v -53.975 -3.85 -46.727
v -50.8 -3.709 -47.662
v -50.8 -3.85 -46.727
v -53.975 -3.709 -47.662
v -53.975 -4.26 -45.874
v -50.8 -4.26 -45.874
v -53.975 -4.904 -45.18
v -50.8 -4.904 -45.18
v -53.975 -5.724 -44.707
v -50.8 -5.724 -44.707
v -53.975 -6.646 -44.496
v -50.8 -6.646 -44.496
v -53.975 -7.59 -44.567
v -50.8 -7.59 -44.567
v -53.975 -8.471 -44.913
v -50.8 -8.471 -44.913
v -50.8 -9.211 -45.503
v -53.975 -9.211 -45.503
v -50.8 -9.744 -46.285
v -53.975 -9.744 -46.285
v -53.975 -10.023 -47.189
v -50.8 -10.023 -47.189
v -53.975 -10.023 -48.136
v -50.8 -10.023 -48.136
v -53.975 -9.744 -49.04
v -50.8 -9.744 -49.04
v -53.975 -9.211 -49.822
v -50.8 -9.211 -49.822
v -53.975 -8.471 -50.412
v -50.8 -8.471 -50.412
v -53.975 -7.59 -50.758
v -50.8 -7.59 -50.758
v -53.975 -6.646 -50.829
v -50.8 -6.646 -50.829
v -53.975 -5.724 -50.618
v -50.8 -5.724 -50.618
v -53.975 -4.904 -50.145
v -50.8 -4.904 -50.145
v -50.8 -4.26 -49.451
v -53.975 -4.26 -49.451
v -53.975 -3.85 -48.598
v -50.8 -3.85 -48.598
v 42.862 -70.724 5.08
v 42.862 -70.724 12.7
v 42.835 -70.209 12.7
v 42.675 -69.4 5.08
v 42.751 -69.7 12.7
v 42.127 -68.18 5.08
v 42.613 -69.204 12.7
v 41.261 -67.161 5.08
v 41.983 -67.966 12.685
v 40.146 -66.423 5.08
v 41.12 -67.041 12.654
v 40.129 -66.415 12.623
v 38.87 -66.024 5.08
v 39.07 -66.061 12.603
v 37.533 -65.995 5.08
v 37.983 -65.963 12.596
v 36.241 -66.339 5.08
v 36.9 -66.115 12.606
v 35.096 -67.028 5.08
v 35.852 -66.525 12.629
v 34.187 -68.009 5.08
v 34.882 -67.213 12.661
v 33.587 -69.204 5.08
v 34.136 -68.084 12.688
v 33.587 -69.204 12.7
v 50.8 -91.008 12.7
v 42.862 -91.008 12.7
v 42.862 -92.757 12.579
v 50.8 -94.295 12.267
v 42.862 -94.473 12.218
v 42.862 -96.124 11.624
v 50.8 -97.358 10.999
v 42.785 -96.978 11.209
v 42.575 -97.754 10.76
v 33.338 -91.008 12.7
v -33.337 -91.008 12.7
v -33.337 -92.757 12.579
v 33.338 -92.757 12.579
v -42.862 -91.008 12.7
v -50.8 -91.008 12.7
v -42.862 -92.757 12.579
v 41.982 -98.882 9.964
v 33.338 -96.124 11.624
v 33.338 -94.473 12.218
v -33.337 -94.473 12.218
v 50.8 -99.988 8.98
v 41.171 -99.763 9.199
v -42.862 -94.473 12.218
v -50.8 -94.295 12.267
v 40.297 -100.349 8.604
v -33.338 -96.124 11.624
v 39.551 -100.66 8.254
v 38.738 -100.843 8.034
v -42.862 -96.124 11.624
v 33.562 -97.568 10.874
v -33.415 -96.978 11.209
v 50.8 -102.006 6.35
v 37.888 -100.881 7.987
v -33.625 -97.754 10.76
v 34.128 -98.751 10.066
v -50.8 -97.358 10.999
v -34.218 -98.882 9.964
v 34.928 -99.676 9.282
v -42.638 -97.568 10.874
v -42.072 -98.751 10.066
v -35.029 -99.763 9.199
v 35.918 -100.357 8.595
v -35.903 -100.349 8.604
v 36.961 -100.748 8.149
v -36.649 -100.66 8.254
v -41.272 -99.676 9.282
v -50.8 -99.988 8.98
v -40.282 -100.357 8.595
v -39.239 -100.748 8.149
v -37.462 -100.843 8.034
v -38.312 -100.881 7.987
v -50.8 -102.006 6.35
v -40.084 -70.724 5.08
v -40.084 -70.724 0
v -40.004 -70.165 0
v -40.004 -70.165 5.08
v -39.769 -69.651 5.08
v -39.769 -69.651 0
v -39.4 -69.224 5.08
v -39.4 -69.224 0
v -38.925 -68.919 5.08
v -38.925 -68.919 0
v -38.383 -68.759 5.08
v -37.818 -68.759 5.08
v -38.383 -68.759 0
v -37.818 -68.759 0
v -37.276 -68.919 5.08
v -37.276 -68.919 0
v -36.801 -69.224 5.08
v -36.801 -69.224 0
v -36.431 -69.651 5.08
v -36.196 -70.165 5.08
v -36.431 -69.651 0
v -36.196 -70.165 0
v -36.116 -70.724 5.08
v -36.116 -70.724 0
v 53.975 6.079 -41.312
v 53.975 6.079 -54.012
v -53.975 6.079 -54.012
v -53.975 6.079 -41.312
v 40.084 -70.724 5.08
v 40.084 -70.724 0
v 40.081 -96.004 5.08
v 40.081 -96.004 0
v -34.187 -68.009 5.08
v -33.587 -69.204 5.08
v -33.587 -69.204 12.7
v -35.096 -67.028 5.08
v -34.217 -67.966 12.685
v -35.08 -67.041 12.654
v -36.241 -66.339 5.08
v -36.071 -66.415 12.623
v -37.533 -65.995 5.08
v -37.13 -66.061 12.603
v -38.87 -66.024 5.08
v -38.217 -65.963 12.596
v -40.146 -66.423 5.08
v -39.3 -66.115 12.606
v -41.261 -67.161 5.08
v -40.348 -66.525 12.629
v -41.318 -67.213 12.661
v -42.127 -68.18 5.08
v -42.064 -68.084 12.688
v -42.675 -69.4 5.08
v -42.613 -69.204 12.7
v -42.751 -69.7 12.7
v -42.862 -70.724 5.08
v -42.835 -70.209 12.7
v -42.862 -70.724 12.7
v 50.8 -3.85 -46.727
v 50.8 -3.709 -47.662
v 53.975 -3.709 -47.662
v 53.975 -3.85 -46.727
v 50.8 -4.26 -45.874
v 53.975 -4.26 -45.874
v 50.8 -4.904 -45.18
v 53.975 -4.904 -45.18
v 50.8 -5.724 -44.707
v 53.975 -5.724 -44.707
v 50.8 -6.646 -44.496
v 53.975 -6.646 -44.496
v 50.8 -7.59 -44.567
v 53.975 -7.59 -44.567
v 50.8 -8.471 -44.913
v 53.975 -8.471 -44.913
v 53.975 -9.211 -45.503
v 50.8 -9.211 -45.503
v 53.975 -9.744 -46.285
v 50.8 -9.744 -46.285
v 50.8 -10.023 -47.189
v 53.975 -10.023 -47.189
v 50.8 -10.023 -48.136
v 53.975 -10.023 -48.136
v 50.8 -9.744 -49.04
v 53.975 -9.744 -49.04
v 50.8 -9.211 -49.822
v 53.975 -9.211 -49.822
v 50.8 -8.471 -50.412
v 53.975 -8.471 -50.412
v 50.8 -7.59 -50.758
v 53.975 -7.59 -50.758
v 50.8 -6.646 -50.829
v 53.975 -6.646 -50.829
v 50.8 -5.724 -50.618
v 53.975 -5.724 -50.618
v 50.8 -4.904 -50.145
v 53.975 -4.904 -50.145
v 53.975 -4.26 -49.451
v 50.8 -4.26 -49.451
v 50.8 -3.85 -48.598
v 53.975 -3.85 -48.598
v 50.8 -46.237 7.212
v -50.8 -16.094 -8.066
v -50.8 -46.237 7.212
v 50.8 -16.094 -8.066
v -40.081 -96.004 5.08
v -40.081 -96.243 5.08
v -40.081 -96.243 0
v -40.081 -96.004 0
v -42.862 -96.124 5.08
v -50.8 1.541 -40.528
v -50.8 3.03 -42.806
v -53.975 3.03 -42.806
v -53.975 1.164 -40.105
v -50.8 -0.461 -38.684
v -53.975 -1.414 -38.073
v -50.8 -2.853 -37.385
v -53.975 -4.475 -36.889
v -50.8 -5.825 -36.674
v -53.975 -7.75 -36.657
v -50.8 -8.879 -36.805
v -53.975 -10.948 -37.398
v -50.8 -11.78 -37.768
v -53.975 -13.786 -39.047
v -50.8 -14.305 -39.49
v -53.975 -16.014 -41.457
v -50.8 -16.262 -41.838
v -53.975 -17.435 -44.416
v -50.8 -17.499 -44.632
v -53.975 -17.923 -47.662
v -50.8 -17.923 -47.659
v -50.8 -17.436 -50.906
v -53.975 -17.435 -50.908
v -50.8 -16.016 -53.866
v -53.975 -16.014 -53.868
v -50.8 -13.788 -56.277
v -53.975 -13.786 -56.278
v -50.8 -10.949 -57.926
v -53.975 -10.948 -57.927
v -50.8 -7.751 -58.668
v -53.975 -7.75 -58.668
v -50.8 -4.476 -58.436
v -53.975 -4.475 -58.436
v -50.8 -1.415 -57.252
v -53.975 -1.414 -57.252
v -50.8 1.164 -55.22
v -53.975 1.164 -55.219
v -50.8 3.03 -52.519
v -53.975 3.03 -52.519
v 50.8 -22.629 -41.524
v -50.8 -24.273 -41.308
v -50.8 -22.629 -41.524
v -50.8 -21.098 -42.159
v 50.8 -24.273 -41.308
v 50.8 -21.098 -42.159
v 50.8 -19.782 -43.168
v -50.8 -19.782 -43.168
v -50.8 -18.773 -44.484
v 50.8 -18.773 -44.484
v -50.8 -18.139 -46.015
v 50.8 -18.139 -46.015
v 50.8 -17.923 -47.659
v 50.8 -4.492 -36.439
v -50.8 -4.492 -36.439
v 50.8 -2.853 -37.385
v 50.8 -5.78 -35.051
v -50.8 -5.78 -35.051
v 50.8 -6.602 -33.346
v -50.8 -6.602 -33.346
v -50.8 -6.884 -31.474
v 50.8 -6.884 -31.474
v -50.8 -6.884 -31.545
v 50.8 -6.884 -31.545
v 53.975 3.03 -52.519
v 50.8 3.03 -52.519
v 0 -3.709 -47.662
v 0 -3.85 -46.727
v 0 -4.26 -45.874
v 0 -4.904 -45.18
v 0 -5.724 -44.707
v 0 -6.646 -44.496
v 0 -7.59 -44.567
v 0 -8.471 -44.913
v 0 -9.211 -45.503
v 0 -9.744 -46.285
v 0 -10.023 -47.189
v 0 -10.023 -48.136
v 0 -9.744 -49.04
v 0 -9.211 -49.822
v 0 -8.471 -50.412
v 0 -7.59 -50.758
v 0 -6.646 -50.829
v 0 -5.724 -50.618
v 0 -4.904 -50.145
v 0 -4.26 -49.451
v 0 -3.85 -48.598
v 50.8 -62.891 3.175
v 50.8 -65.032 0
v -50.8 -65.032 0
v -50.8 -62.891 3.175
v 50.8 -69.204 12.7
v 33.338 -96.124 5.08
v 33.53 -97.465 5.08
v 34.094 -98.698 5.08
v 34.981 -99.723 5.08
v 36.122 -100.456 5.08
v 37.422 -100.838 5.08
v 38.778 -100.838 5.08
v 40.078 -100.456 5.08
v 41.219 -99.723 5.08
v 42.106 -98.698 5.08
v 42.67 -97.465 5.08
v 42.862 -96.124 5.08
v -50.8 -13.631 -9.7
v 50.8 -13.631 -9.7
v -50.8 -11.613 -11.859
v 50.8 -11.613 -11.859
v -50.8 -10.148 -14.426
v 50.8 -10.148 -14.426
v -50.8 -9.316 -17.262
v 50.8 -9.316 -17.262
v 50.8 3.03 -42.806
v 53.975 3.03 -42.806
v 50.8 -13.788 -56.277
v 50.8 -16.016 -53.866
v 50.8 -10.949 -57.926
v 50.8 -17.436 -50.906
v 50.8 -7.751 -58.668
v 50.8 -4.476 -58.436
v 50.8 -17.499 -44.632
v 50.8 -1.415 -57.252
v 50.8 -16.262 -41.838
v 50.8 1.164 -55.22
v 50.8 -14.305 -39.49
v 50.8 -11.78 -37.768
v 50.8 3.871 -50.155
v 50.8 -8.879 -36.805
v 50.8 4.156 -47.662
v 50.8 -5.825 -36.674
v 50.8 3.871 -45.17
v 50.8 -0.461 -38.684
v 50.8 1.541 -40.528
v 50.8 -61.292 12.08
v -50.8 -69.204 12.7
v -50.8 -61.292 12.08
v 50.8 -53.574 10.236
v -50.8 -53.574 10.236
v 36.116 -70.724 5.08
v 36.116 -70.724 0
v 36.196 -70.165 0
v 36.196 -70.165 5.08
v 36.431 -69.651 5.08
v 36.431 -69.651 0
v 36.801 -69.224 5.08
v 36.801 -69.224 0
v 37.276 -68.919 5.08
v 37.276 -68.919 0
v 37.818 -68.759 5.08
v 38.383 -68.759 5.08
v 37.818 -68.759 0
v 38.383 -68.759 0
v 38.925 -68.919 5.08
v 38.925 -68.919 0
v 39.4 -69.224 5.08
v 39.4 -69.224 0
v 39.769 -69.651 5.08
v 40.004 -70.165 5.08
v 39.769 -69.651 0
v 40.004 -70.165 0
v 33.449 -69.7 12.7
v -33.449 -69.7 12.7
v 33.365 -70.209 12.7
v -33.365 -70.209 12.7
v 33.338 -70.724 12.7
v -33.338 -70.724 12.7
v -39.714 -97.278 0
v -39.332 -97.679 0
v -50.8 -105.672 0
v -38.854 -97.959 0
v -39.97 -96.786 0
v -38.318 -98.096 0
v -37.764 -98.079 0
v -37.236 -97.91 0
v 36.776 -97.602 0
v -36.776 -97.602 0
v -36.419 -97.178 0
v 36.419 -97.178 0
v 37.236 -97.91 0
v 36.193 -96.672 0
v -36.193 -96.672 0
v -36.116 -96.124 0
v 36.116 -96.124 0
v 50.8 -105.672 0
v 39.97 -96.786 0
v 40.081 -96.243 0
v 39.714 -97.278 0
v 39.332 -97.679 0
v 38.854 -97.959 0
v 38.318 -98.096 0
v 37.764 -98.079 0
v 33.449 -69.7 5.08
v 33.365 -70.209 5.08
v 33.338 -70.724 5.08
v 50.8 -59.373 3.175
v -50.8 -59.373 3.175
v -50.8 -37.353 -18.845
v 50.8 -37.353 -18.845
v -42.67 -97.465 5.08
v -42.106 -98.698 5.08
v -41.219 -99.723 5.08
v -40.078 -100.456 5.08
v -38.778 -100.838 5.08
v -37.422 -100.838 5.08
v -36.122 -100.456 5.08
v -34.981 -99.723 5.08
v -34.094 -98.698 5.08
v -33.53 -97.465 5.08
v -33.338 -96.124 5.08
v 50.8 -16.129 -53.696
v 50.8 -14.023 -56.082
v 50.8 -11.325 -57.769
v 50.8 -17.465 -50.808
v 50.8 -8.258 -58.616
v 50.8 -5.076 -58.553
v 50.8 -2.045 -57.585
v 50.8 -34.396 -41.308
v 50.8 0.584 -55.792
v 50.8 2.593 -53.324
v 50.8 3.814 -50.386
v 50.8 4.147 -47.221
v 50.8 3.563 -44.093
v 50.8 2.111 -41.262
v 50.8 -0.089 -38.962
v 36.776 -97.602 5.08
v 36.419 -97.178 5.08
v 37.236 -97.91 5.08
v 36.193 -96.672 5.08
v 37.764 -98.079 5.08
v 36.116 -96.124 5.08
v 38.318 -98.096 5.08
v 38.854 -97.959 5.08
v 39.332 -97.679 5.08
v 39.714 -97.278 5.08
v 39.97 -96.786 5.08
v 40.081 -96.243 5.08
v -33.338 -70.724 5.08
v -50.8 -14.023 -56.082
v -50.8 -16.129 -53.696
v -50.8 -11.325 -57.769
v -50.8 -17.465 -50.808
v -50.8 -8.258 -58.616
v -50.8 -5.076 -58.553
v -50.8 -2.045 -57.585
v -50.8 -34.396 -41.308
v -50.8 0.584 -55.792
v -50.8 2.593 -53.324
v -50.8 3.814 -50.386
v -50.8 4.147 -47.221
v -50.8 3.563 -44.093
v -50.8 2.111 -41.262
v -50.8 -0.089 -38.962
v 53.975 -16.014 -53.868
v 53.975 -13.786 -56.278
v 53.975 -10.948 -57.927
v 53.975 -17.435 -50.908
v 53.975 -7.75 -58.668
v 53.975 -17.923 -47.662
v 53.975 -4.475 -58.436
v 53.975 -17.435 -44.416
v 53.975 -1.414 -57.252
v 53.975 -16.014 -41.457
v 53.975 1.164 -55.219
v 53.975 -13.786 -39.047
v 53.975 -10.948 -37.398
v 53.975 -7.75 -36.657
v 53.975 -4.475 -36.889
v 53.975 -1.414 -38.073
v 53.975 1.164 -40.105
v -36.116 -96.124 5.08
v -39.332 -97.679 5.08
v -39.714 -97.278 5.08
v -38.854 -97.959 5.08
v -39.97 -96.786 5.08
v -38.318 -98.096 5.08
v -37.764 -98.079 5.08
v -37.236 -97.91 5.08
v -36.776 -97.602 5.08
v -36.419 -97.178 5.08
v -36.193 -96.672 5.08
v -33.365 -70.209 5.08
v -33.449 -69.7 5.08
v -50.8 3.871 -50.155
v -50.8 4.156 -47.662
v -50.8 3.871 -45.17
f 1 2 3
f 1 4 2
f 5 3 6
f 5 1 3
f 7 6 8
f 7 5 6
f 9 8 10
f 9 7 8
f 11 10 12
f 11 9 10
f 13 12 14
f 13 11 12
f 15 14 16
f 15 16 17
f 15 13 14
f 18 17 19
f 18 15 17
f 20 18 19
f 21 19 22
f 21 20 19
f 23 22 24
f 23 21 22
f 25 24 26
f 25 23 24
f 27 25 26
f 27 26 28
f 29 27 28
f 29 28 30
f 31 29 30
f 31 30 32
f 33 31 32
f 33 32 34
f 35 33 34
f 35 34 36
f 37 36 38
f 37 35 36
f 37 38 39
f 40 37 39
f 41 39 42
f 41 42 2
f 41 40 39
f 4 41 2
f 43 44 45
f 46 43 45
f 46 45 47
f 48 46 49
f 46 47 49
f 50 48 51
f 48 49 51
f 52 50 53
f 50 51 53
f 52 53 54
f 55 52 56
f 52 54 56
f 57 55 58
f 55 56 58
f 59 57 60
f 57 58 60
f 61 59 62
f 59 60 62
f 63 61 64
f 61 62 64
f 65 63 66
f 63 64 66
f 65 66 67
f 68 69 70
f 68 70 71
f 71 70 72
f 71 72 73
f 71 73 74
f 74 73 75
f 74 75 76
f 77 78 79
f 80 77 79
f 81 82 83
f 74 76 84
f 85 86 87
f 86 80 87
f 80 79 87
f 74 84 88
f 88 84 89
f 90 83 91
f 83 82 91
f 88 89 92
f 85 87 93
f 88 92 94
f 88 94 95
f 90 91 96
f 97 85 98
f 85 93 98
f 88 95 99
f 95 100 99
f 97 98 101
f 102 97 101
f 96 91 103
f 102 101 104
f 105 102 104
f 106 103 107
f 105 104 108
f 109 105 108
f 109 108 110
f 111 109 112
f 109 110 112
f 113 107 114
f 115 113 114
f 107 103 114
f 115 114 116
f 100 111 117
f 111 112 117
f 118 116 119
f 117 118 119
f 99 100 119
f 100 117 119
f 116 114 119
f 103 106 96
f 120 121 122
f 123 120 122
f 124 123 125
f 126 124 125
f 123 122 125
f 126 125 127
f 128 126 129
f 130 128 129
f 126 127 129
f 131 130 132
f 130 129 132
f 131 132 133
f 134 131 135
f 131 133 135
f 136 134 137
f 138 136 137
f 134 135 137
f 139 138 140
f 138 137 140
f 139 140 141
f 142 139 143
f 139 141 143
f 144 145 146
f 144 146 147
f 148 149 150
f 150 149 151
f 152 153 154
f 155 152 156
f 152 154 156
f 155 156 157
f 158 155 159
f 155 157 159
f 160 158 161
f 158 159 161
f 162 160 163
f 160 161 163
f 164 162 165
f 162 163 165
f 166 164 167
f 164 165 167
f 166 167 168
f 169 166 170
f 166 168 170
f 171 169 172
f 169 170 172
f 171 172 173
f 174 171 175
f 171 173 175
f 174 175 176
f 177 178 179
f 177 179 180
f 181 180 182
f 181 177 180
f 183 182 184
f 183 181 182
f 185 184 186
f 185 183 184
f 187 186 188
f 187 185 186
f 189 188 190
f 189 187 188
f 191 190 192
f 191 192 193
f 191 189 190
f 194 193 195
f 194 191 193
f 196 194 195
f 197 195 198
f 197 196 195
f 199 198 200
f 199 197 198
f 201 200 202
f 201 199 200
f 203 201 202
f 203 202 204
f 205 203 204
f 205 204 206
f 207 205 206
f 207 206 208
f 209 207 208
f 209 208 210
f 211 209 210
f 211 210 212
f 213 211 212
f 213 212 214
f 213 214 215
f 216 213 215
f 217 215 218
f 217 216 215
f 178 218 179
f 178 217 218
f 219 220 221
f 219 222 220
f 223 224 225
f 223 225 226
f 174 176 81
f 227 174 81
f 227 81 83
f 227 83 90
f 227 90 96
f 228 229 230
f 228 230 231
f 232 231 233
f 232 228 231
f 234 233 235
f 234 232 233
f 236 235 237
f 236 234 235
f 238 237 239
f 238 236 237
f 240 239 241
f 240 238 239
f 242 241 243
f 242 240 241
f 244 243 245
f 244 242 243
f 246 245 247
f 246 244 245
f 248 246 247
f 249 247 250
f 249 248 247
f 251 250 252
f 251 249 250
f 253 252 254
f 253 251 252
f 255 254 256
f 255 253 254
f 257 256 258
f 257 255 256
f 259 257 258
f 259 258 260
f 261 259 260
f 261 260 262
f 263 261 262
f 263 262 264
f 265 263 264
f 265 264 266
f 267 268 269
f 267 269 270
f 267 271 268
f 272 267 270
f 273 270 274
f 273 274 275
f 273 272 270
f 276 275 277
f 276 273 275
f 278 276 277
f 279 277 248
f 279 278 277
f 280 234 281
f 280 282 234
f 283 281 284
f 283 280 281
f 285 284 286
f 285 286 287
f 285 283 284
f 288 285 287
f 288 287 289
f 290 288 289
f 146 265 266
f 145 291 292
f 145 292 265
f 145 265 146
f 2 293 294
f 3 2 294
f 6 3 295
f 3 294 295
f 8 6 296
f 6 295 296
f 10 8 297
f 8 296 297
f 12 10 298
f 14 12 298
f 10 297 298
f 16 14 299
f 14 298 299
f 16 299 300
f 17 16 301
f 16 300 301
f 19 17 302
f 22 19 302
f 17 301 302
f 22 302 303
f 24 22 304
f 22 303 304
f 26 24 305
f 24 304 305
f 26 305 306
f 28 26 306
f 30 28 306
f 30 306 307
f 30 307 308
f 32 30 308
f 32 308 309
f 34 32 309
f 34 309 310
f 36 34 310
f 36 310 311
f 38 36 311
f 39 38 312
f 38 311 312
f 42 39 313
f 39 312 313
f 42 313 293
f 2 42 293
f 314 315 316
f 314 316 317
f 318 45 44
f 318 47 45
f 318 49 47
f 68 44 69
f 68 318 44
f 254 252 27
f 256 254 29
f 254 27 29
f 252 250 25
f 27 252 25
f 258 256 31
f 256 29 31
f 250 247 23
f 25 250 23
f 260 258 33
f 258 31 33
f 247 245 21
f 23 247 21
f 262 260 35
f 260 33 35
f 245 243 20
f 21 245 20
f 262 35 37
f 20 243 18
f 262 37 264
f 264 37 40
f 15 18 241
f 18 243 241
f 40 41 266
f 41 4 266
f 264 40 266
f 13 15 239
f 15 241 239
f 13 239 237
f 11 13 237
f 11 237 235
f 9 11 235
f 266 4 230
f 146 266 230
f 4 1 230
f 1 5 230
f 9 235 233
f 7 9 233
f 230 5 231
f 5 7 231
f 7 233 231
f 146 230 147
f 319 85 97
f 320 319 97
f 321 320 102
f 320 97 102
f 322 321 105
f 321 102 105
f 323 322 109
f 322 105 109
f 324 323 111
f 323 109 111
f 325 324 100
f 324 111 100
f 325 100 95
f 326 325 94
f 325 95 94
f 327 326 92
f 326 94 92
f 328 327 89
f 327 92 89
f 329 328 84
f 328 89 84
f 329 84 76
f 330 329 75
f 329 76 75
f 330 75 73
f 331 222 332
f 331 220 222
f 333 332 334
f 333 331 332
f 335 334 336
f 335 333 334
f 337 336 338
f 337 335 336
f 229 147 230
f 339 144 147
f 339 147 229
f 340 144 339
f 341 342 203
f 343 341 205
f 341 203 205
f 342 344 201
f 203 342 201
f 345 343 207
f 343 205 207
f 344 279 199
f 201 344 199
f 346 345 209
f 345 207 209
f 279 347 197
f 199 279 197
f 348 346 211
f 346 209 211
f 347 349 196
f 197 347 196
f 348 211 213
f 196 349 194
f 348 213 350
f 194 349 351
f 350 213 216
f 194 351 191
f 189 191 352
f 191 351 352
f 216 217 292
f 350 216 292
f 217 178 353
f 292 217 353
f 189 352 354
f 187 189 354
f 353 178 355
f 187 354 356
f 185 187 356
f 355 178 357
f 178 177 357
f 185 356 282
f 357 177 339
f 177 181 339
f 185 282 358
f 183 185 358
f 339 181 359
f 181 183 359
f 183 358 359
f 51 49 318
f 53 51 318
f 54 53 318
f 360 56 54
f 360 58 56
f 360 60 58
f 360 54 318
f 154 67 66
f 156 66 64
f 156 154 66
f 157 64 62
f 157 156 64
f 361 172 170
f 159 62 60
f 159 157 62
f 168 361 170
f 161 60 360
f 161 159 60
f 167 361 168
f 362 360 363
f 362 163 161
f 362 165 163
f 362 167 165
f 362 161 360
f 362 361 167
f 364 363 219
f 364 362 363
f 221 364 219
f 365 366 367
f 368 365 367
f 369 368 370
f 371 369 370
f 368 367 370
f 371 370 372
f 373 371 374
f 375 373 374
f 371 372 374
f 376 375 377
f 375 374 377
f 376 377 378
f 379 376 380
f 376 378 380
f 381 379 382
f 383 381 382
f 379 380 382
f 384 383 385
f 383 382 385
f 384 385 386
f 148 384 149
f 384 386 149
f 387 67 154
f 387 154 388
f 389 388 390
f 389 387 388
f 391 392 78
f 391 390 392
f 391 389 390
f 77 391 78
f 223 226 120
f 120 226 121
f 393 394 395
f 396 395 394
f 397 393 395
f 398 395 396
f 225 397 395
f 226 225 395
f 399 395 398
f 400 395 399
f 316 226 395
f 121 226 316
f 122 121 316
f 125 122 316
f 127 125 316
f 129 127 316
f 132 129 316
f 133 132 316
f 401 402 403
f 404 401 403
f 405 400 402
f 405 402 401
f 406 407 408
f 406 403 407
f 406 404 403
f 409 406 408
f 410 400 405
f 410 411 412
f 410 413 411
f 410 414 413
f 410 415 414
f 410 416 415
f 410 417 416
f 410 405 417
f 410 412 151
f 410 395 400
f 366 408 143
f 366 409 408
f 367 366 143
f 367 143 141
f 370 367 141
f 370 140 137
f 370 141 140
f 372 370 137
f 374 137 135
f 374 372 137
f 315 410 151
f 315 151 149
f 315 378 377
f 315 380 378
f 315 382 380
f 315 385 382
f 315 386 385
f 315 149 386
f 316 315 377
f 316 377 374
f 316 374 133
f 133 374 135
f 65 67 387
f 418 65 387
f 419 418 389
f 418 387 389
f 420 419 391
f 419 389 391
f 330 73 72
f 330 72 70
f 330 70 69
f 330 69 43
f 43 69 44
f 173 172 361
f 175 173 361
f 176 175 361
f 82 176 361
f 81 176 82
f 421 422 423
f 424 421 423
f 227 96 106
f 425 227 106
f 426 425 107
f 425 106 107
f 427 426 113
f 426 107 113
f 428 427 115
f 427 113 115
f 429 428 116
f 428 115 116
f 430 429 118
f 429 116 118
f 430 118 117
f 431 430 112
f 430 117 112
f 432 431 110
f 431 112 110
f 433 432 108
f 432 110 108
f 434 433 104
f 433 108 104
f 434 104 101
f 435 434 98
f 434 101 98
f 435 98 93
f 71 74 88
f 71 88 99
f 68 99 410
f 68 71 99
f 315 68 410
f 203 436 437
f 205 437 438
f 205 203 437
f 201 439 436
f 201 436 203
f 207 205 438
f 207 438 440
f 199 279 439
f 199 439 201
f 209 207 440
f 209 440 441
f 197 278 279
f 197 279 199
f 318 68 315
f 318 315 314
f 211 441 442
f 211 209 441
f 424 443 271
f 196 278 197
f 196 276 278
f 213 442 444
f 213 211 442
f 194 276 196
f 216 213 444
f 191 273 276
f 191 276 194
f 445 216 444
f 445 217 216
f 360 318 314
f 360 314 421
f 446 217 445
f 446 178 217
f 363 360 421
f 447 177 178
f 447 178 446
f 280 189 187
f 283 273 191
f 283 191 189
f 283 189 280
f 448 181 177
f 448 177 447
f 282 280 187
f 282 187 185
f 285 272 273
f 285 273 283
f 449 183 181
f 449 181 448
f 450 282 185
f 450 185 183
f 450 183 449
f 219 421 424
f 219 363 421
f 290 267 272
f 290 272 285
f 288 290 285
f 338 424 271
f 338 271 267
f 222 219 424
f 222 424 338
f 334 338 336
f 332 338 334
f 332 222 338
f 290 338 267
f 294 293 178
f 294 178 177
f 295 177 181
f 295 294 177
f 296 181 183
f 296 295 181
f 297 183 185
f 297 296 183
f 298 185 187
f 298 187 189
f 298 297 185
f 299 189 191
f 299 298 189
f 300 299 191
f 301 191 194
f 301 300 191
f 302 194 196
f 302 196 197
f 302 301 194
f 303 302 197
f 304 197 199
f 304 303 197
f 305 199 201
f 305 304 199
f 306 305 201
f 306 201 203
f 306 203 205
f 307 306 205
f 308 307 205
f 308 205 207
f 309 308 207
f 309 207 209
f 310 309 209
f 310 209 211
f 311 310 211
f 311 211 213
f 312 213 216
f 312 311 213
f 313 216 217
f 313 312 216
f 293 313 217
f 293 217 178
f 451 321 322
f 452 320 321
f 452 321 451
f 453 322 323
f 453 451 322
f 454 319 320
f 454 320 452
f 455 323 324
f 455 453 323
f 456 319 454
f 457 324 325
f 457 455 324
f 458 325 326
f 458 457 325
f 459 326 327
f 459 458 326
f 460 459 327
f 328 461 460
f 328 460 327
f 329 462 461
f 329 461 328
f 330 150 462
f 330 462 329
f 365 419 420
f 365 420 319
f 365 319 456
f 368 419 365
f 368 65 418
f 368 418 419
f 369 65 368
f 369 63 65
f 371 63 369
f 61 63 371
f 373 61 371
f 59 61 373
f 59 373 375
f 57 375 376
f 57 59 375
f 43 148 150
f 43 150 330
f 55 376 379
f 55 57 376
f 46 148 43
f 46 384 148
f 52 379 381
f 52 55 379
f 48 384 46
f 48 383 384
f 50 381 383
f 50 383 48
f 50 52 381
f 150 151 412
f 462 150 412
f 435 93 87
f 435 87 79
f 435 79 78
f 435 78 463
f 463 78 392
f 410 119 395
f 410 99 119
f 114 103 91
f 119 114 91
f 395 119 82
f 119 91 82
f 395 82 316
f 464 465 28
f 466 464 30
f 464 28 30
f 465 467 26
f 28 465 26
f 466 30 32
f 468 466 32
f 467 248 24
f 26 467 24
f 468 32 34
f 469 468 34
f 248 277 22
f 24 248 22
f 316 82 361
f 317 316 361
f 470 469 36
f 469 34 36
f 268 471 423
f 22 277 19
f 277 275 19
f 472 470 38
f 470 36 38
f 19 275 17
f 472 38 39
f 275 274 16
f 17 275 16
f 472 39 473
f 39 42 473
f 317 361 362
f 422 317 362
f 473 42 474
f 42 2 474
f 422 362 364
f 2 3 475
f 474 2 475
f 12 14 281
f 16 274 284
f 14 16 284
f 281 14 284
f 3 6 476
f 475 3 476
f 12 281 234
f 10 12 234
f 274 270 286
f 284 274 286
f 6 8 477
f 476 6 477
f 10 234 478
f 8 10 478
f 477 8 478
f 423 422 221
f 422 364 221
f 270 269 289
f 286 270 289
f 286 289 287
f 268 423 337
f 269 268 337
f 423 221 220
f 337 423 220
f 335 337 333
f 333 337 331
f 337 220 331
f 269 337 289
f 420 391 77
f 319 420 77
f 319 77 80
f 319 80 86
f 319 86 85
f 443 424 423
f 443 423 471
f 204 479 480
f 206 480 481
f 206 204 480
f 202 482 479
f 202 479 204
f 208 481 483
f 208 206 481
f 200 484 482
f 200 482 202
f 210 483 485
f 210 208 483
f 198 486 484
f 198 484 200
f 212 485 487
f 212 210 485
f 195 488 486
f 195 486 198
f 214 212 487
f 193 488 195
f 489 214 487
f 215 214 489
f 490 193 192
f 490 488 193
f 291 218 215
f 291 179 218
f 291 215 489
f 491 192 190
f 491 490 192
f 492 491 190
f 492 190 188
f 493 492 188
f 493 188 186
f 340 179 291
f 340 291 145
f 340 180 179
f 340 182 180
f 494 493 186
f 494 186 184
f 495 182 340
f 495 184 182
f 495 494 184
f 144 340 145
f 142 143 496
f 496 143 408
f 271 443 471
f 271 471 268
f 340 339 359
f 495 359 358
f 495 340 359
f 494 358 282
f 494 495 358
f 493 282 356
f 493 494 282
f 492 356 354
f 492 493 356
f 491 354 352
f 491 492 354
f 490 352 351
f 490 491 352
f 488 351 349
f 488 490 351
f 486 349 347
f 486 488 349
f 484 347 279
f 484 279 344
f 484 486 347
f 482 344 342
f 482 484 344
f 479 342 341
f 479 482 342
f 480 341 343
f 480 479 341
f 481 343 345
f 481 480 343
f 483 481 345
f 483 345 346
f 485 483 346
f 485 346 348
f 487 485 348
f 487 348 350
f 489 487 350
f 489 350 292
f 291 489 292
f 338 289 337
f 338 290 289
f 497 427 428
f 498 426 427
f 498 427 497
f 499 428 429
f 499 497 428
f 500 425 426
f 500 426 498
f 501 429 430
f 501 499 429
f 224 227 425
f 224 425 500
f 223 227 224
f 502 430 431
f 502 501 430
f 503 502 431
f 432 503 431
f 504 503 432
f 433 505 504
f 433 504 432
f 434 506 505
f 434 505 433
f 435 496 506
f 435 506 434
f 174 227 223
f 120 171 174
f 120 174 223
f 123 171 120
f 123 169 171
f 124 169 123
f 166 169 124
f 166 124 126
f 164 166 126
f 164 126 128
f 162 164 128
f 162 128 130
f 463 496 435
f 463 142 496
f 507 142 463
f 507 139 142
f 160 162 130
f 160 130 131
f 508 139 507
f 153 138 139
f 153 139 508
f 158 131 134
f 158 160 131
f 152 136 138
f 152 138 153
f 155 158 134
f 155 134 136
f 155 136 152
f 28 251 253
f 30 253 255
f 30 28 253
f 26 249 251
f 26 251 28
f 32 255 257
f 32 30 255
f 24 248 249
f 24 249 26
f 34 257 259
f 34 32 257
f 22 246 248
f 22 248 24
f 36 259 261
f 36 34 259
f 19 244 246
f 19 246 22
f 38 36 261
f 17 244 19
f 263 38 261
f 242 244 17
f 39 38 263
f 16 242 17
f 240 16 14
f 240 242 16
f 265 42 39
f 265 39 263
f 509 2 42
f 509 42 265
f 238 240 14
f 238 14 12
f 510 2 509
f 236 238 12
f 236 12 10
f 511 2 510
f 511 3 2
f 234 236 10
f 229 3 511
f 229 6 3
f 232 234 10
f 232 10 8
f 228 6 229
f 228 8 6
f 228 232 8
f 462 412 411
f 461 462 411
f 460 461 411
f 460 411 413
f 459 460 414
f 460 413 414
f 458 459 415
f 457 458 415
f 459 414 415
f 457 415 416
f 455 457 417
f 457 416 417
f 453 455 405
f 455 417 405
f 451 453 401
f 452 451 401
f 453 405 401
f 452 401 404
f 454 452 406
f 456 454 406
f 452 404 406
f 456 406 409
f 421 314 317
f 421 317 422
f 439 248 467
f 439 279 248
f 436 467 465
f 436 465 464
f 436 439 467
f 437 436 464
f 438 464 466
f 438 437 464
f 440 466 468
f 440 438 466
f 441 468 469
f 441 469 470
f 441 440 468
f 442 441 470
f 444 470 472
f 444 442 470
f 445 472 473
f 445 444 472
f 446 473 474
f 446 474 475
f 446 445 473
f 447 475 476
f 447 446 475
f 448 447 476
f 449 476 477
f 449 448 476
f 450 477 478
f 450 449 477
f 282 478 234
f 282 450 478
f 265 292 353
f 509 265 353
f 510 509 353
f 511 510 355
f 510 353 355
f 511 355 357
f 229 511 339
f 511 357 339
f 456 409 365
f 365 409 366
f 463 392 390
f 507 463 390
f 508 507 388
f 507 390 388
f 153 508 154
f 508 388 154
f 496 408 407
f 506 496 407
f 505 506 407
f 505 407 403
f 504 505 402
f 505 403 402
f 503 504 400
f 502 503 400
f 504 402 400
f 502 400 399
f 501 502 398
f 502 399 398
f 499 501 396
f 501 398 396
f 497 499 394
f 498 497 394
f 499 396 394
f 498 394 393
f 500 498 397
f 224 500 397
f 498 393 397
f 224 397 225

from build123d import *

# Parameters (mm, degrees)
F3_DEPTH      = 50.8
F4_R          = 3.175
F5_DEPTH      = 50.8
F5_DEPTH_BACK = 50.8
F6_R          = 50.8
F7_R          = 12.7
F9_DEPTH      = 12.7
F11_DEPTH     = 7.62
F12_R         = 3.175
F13_DEPTH     = 53.975


# Not quite as in the source:
# - the program builds the solid bodies; features that only make, move or delete a surface that nothing else refers to are left out


with BuildPart() as f3:
    # F2 (on Right) → F3 (new body, symmetric)
    with BuildSketch(Plane.YZ):
        with BuildLine():
            Line((-98.3398951496, 12.7), (-105.6722435683, 0))
            Line((-105.6722435683, 0), (-65.0322435683, 0))
            Line((-65.0322435683, 0), (-62.8906790273, 3.175))
            Line((-62.8906790273, 3.175), (-59.3727790273, 3.175))
            Line((-59.3727790273, 3.175), (-37.3531910185, -18.8445880089))
            Line((-37.3531910185, -18.8445880089), (-34.3958851866, -41.307555944))
            Line((-34.3958851866, -41.307555944), (-21.6958851866, -41.307555944))
            ThreePointArc((-21.6958851866, -41.307555944), (-15.7538496208, -34.2048736472), (-6.8837446161, -31.5445880089))
            Line((-6.8837446161, -31.5445880089), (-10.3898009598, -10.9572655931))
            Line((-10.3898009598, -10.9572655931), (-57.0648951496, 12.7))
            Line((-57.0648951496, 12.7), (-98.3398951496, 12.7))
        make_face()
    extrude(amount=F3_DEPTH, both=True)

    # F4 (on Right) → F5 (join, two sides)
    with BuildSketch(Plane.YZ) as f5_sk:
        with BuildLine():
            Line((-6.8837446161, -31.4737667411), (-6.8837446161, -31.5445880089))
            ThreePointArc((-6.8837446161, -31.5445880089), (-15.7538496208, -34.2048736472), (-21.6958851866, -41.307555944))
            Line((-21.6958851866, -41.307555944), (-24.273218614, -41.307555944))
            ThreePointArc((-24.273218614, -41.307555944), (-19.7824672698, -43.1680512537), (-17.9232188588, -47.6593189789))
            ThreePointArc((-17.9232188588, -47.6593189789), (-0.665383222, -56.7838960892), (-2.8525323178, -37.3852575509))
            ThreePointArc((-2.8525323178, -37.3852575509), (-5.7800195758, -35.0513495908), (-6.8837446161, -31.4737667411))
        make_face()
        with Locations((-6.8837446161, -47.6623840148)):
            Circle(F4_R, mode=Mode.SUBTRACT)
    extrude(amount=F5_DEPTH)
    extrude(f5_sk.sketch, amount=-F5_DEPTH_BACK)

    # F6
    f6_edges = [f3.edges().sort_by_distance(p)[0] for p in [
        (0, -57.064895, 12.7),
    ]]
    fillet(f6_edges, radius=F6_R)

    # F7
    f7_edges = [f3.edges().sort_by_distance(p)[0] for p in [
        (0, -98.339895, 12.7),
        (0, -10.389801, -10.957266),
    ]]
    fillet(f7_edges, radius=F7_R)

    # F8 (on face) → F9 (cut, through all)
    with BuildSketch(Plane(origin=(0, 0, 0), x_dir=(1, 0, 0), z_dir=(0, 0, -1))):
        with BuildLine():
            Line((36.115625, 96.1236006856), (36.115625, 70.7236006856))
            ThreePointArc((36.115625, 70.7236006856), (38.1001408337, 68.7392256906), (40.08437498, 70.7238823529))
            Line((40.08437498, 70.7238823529), (40.0807866095, 96.0043172068))
            Line((40.0807866095, 96.0043172068), (40.0807526669, 96.2434464755))
            ThreePointArc((40.0807526669, 96.2434464755), (38.0400497401, 98.1070698956), (36.115625, 96.1236006856))
        make_face()
        with BuildLine():
            Line((-40.0807866095, 96.0043172068), (-40.08437498, 70.7238823529))
            ThreePointArc((-40.08437498, 70.7238823529), (-38.1001408337, 68.7392256906), (-36.115625, 70.7236006856))
            Line((-36.115625, 70.7236006856), (-36.115625, 96.1236006856))
            ThreePointArc((-36.115625, 96.1236006856), (-38.0400497401, 98.1070698956), (-40.0807526669, 96.2434464755))
            Line((-40.0807526669, 96.2434464755), (-40.0807866095, 96.0043172068))
        make_face()
    extrude(amount=-F9_DEPTH, mode=Mode.SUBTRACT)

    # F10 (on face) → F11 (cut)
    with BuildSketch(Plane.XY.offset(12.7)):
        with BuildLine():
            Line((-42.8625, -70.7236006856), (-42.8625, -96.1236006856))
            ThreePointArc((-42.8625, -96.1236006856), (-38.1, -100.8861006856), (-33.3375, -96.1236006856))
            Line((-33.3375, -96.1236006856), (-33.3375, -91.0075467309))
            Line((-33.3375, -91.0075467309), (-36.115625, -91.0075467309))
            Line((-36.115625, -91.0075467309), (-36.115625, -70.7236006856))
            ThreePointArc((-36.115625, -70.7236006856), (-36.30144514, -69.8851827968), (-36.8241045528, -69.2037865692))
            Line((-36.8241045528, -69.2037865692), (-33.5865122907, -69.2037865692))
            ThreePointArc((-33.5865122907, -69.2037865692), (-38.870039296, -66.0237660361), (-42.8625, -70.7236006856))
        make_face()
        with BuildLine():
            Line((-36.115625, -91.0075467309), (-33.3375, -91.0075467309))
            Line((-33.3375, -91.0075467309), (-33.3375, -70.7236006856))
            ThreePointArc((-33.3375, -70.7236006856), (-33.4001653505, -69.9535613896), (-33.5865122907, -69.2037865692))
            Line((-33.5865122907, -69.2037865692), (-36.8241045528, -69.2037865692))
            ThreePointArc((-36.8241045528, -69.2037865692), (-36.30144514, -69.8851827968), (-36.115625, -70.7236006856))
            Line((-36.115625, -70.7236006856), (-36.115625, -91.0075467309))
        make_face()
        with BuildLine():
            Line((36.115625, -91.0075467309), (33.3375, -91.0075467309))
            Line((33.3375, -91.0075467309), (33.3375, -96.1236006856))
            ThreePointArc((33.3375, -96.1236006856), (38.1, -100.8861006856), (42.8625, -96.1236006856))
            Line((42.8625, -96.1236006856), (42.8625, -70.7236006856))
            ThreePointArc((42.8625, -70.7236006856), (38.870039296, -66.0237660361), (33.5865122907, -69.2037865692))
            Line((33.5865122907, -69.2037865692), (36.8241045528, -69.2037865692))
            ThreePointArc((36.8241045528, -69.2037865692), (36.30144514, -69.8851827968), (36.115625, -70.7236006856))
            Line((36.115625, -70.7236006856), (36.115625, -91.0075467309))
        make_face()
        with BuildLine():
            Line((33.3375, -70.7236006856), (33.3375, -91.0075467309))
            Line((33.3375, -91.0075467309), (36.115625, -91.0075467309))
            Line((36.115625, -91.0075467309), (36.115625, -70.7236006856))
            ThreePointArc((36.115625, -70.7236006856), (36.30144514, -69.8851827968), (36.8241045528, -69.2037865692))
            Line((36.8241045528, -69.2037865692), (33.5865122907, -69.2037865692))
            ThreePointArc((33.5865122907, -69.2037865692), (33.4001653505, -69.9535613896), (33.3375, -70.7236006856))
        make_face()
    extrude(amount=-F11_DEPTH, mode=Mode.SUBTRACT)


with BuildPart() as f13:
    # F12 (on Right) → F13 (new body, symmetric)
    with BuildSketch(Plane.YZ):
        with BuildLine():
            ThreePointArc((3.0300645432, -42.8058019962), (-17.9232192843, -47.6623840148), (3.0300645432, -52.5189660334))
            Line((3.0300645432, -52.5189660334), (6.0785996665, -54.0123840148))
            Line((6.0785996665, -54.0123840148), (6.0785996665, -41.3123840148))
            Line((6.0785996665, -41.3123840148), (3.0300645432, -42.8058019962))
        make_face()
        with Locations((-6.8837446161, -47.6623840148)):
            Circle(F12_R, mode=Mode.SUBTRACT)
    extrude(amount=F13_DEPTH, both=True)

    # F14: cut F3
    add(f3.part, mode=Mode.SUBTRACT)


solid = Compound([f3.part, f13.part])
